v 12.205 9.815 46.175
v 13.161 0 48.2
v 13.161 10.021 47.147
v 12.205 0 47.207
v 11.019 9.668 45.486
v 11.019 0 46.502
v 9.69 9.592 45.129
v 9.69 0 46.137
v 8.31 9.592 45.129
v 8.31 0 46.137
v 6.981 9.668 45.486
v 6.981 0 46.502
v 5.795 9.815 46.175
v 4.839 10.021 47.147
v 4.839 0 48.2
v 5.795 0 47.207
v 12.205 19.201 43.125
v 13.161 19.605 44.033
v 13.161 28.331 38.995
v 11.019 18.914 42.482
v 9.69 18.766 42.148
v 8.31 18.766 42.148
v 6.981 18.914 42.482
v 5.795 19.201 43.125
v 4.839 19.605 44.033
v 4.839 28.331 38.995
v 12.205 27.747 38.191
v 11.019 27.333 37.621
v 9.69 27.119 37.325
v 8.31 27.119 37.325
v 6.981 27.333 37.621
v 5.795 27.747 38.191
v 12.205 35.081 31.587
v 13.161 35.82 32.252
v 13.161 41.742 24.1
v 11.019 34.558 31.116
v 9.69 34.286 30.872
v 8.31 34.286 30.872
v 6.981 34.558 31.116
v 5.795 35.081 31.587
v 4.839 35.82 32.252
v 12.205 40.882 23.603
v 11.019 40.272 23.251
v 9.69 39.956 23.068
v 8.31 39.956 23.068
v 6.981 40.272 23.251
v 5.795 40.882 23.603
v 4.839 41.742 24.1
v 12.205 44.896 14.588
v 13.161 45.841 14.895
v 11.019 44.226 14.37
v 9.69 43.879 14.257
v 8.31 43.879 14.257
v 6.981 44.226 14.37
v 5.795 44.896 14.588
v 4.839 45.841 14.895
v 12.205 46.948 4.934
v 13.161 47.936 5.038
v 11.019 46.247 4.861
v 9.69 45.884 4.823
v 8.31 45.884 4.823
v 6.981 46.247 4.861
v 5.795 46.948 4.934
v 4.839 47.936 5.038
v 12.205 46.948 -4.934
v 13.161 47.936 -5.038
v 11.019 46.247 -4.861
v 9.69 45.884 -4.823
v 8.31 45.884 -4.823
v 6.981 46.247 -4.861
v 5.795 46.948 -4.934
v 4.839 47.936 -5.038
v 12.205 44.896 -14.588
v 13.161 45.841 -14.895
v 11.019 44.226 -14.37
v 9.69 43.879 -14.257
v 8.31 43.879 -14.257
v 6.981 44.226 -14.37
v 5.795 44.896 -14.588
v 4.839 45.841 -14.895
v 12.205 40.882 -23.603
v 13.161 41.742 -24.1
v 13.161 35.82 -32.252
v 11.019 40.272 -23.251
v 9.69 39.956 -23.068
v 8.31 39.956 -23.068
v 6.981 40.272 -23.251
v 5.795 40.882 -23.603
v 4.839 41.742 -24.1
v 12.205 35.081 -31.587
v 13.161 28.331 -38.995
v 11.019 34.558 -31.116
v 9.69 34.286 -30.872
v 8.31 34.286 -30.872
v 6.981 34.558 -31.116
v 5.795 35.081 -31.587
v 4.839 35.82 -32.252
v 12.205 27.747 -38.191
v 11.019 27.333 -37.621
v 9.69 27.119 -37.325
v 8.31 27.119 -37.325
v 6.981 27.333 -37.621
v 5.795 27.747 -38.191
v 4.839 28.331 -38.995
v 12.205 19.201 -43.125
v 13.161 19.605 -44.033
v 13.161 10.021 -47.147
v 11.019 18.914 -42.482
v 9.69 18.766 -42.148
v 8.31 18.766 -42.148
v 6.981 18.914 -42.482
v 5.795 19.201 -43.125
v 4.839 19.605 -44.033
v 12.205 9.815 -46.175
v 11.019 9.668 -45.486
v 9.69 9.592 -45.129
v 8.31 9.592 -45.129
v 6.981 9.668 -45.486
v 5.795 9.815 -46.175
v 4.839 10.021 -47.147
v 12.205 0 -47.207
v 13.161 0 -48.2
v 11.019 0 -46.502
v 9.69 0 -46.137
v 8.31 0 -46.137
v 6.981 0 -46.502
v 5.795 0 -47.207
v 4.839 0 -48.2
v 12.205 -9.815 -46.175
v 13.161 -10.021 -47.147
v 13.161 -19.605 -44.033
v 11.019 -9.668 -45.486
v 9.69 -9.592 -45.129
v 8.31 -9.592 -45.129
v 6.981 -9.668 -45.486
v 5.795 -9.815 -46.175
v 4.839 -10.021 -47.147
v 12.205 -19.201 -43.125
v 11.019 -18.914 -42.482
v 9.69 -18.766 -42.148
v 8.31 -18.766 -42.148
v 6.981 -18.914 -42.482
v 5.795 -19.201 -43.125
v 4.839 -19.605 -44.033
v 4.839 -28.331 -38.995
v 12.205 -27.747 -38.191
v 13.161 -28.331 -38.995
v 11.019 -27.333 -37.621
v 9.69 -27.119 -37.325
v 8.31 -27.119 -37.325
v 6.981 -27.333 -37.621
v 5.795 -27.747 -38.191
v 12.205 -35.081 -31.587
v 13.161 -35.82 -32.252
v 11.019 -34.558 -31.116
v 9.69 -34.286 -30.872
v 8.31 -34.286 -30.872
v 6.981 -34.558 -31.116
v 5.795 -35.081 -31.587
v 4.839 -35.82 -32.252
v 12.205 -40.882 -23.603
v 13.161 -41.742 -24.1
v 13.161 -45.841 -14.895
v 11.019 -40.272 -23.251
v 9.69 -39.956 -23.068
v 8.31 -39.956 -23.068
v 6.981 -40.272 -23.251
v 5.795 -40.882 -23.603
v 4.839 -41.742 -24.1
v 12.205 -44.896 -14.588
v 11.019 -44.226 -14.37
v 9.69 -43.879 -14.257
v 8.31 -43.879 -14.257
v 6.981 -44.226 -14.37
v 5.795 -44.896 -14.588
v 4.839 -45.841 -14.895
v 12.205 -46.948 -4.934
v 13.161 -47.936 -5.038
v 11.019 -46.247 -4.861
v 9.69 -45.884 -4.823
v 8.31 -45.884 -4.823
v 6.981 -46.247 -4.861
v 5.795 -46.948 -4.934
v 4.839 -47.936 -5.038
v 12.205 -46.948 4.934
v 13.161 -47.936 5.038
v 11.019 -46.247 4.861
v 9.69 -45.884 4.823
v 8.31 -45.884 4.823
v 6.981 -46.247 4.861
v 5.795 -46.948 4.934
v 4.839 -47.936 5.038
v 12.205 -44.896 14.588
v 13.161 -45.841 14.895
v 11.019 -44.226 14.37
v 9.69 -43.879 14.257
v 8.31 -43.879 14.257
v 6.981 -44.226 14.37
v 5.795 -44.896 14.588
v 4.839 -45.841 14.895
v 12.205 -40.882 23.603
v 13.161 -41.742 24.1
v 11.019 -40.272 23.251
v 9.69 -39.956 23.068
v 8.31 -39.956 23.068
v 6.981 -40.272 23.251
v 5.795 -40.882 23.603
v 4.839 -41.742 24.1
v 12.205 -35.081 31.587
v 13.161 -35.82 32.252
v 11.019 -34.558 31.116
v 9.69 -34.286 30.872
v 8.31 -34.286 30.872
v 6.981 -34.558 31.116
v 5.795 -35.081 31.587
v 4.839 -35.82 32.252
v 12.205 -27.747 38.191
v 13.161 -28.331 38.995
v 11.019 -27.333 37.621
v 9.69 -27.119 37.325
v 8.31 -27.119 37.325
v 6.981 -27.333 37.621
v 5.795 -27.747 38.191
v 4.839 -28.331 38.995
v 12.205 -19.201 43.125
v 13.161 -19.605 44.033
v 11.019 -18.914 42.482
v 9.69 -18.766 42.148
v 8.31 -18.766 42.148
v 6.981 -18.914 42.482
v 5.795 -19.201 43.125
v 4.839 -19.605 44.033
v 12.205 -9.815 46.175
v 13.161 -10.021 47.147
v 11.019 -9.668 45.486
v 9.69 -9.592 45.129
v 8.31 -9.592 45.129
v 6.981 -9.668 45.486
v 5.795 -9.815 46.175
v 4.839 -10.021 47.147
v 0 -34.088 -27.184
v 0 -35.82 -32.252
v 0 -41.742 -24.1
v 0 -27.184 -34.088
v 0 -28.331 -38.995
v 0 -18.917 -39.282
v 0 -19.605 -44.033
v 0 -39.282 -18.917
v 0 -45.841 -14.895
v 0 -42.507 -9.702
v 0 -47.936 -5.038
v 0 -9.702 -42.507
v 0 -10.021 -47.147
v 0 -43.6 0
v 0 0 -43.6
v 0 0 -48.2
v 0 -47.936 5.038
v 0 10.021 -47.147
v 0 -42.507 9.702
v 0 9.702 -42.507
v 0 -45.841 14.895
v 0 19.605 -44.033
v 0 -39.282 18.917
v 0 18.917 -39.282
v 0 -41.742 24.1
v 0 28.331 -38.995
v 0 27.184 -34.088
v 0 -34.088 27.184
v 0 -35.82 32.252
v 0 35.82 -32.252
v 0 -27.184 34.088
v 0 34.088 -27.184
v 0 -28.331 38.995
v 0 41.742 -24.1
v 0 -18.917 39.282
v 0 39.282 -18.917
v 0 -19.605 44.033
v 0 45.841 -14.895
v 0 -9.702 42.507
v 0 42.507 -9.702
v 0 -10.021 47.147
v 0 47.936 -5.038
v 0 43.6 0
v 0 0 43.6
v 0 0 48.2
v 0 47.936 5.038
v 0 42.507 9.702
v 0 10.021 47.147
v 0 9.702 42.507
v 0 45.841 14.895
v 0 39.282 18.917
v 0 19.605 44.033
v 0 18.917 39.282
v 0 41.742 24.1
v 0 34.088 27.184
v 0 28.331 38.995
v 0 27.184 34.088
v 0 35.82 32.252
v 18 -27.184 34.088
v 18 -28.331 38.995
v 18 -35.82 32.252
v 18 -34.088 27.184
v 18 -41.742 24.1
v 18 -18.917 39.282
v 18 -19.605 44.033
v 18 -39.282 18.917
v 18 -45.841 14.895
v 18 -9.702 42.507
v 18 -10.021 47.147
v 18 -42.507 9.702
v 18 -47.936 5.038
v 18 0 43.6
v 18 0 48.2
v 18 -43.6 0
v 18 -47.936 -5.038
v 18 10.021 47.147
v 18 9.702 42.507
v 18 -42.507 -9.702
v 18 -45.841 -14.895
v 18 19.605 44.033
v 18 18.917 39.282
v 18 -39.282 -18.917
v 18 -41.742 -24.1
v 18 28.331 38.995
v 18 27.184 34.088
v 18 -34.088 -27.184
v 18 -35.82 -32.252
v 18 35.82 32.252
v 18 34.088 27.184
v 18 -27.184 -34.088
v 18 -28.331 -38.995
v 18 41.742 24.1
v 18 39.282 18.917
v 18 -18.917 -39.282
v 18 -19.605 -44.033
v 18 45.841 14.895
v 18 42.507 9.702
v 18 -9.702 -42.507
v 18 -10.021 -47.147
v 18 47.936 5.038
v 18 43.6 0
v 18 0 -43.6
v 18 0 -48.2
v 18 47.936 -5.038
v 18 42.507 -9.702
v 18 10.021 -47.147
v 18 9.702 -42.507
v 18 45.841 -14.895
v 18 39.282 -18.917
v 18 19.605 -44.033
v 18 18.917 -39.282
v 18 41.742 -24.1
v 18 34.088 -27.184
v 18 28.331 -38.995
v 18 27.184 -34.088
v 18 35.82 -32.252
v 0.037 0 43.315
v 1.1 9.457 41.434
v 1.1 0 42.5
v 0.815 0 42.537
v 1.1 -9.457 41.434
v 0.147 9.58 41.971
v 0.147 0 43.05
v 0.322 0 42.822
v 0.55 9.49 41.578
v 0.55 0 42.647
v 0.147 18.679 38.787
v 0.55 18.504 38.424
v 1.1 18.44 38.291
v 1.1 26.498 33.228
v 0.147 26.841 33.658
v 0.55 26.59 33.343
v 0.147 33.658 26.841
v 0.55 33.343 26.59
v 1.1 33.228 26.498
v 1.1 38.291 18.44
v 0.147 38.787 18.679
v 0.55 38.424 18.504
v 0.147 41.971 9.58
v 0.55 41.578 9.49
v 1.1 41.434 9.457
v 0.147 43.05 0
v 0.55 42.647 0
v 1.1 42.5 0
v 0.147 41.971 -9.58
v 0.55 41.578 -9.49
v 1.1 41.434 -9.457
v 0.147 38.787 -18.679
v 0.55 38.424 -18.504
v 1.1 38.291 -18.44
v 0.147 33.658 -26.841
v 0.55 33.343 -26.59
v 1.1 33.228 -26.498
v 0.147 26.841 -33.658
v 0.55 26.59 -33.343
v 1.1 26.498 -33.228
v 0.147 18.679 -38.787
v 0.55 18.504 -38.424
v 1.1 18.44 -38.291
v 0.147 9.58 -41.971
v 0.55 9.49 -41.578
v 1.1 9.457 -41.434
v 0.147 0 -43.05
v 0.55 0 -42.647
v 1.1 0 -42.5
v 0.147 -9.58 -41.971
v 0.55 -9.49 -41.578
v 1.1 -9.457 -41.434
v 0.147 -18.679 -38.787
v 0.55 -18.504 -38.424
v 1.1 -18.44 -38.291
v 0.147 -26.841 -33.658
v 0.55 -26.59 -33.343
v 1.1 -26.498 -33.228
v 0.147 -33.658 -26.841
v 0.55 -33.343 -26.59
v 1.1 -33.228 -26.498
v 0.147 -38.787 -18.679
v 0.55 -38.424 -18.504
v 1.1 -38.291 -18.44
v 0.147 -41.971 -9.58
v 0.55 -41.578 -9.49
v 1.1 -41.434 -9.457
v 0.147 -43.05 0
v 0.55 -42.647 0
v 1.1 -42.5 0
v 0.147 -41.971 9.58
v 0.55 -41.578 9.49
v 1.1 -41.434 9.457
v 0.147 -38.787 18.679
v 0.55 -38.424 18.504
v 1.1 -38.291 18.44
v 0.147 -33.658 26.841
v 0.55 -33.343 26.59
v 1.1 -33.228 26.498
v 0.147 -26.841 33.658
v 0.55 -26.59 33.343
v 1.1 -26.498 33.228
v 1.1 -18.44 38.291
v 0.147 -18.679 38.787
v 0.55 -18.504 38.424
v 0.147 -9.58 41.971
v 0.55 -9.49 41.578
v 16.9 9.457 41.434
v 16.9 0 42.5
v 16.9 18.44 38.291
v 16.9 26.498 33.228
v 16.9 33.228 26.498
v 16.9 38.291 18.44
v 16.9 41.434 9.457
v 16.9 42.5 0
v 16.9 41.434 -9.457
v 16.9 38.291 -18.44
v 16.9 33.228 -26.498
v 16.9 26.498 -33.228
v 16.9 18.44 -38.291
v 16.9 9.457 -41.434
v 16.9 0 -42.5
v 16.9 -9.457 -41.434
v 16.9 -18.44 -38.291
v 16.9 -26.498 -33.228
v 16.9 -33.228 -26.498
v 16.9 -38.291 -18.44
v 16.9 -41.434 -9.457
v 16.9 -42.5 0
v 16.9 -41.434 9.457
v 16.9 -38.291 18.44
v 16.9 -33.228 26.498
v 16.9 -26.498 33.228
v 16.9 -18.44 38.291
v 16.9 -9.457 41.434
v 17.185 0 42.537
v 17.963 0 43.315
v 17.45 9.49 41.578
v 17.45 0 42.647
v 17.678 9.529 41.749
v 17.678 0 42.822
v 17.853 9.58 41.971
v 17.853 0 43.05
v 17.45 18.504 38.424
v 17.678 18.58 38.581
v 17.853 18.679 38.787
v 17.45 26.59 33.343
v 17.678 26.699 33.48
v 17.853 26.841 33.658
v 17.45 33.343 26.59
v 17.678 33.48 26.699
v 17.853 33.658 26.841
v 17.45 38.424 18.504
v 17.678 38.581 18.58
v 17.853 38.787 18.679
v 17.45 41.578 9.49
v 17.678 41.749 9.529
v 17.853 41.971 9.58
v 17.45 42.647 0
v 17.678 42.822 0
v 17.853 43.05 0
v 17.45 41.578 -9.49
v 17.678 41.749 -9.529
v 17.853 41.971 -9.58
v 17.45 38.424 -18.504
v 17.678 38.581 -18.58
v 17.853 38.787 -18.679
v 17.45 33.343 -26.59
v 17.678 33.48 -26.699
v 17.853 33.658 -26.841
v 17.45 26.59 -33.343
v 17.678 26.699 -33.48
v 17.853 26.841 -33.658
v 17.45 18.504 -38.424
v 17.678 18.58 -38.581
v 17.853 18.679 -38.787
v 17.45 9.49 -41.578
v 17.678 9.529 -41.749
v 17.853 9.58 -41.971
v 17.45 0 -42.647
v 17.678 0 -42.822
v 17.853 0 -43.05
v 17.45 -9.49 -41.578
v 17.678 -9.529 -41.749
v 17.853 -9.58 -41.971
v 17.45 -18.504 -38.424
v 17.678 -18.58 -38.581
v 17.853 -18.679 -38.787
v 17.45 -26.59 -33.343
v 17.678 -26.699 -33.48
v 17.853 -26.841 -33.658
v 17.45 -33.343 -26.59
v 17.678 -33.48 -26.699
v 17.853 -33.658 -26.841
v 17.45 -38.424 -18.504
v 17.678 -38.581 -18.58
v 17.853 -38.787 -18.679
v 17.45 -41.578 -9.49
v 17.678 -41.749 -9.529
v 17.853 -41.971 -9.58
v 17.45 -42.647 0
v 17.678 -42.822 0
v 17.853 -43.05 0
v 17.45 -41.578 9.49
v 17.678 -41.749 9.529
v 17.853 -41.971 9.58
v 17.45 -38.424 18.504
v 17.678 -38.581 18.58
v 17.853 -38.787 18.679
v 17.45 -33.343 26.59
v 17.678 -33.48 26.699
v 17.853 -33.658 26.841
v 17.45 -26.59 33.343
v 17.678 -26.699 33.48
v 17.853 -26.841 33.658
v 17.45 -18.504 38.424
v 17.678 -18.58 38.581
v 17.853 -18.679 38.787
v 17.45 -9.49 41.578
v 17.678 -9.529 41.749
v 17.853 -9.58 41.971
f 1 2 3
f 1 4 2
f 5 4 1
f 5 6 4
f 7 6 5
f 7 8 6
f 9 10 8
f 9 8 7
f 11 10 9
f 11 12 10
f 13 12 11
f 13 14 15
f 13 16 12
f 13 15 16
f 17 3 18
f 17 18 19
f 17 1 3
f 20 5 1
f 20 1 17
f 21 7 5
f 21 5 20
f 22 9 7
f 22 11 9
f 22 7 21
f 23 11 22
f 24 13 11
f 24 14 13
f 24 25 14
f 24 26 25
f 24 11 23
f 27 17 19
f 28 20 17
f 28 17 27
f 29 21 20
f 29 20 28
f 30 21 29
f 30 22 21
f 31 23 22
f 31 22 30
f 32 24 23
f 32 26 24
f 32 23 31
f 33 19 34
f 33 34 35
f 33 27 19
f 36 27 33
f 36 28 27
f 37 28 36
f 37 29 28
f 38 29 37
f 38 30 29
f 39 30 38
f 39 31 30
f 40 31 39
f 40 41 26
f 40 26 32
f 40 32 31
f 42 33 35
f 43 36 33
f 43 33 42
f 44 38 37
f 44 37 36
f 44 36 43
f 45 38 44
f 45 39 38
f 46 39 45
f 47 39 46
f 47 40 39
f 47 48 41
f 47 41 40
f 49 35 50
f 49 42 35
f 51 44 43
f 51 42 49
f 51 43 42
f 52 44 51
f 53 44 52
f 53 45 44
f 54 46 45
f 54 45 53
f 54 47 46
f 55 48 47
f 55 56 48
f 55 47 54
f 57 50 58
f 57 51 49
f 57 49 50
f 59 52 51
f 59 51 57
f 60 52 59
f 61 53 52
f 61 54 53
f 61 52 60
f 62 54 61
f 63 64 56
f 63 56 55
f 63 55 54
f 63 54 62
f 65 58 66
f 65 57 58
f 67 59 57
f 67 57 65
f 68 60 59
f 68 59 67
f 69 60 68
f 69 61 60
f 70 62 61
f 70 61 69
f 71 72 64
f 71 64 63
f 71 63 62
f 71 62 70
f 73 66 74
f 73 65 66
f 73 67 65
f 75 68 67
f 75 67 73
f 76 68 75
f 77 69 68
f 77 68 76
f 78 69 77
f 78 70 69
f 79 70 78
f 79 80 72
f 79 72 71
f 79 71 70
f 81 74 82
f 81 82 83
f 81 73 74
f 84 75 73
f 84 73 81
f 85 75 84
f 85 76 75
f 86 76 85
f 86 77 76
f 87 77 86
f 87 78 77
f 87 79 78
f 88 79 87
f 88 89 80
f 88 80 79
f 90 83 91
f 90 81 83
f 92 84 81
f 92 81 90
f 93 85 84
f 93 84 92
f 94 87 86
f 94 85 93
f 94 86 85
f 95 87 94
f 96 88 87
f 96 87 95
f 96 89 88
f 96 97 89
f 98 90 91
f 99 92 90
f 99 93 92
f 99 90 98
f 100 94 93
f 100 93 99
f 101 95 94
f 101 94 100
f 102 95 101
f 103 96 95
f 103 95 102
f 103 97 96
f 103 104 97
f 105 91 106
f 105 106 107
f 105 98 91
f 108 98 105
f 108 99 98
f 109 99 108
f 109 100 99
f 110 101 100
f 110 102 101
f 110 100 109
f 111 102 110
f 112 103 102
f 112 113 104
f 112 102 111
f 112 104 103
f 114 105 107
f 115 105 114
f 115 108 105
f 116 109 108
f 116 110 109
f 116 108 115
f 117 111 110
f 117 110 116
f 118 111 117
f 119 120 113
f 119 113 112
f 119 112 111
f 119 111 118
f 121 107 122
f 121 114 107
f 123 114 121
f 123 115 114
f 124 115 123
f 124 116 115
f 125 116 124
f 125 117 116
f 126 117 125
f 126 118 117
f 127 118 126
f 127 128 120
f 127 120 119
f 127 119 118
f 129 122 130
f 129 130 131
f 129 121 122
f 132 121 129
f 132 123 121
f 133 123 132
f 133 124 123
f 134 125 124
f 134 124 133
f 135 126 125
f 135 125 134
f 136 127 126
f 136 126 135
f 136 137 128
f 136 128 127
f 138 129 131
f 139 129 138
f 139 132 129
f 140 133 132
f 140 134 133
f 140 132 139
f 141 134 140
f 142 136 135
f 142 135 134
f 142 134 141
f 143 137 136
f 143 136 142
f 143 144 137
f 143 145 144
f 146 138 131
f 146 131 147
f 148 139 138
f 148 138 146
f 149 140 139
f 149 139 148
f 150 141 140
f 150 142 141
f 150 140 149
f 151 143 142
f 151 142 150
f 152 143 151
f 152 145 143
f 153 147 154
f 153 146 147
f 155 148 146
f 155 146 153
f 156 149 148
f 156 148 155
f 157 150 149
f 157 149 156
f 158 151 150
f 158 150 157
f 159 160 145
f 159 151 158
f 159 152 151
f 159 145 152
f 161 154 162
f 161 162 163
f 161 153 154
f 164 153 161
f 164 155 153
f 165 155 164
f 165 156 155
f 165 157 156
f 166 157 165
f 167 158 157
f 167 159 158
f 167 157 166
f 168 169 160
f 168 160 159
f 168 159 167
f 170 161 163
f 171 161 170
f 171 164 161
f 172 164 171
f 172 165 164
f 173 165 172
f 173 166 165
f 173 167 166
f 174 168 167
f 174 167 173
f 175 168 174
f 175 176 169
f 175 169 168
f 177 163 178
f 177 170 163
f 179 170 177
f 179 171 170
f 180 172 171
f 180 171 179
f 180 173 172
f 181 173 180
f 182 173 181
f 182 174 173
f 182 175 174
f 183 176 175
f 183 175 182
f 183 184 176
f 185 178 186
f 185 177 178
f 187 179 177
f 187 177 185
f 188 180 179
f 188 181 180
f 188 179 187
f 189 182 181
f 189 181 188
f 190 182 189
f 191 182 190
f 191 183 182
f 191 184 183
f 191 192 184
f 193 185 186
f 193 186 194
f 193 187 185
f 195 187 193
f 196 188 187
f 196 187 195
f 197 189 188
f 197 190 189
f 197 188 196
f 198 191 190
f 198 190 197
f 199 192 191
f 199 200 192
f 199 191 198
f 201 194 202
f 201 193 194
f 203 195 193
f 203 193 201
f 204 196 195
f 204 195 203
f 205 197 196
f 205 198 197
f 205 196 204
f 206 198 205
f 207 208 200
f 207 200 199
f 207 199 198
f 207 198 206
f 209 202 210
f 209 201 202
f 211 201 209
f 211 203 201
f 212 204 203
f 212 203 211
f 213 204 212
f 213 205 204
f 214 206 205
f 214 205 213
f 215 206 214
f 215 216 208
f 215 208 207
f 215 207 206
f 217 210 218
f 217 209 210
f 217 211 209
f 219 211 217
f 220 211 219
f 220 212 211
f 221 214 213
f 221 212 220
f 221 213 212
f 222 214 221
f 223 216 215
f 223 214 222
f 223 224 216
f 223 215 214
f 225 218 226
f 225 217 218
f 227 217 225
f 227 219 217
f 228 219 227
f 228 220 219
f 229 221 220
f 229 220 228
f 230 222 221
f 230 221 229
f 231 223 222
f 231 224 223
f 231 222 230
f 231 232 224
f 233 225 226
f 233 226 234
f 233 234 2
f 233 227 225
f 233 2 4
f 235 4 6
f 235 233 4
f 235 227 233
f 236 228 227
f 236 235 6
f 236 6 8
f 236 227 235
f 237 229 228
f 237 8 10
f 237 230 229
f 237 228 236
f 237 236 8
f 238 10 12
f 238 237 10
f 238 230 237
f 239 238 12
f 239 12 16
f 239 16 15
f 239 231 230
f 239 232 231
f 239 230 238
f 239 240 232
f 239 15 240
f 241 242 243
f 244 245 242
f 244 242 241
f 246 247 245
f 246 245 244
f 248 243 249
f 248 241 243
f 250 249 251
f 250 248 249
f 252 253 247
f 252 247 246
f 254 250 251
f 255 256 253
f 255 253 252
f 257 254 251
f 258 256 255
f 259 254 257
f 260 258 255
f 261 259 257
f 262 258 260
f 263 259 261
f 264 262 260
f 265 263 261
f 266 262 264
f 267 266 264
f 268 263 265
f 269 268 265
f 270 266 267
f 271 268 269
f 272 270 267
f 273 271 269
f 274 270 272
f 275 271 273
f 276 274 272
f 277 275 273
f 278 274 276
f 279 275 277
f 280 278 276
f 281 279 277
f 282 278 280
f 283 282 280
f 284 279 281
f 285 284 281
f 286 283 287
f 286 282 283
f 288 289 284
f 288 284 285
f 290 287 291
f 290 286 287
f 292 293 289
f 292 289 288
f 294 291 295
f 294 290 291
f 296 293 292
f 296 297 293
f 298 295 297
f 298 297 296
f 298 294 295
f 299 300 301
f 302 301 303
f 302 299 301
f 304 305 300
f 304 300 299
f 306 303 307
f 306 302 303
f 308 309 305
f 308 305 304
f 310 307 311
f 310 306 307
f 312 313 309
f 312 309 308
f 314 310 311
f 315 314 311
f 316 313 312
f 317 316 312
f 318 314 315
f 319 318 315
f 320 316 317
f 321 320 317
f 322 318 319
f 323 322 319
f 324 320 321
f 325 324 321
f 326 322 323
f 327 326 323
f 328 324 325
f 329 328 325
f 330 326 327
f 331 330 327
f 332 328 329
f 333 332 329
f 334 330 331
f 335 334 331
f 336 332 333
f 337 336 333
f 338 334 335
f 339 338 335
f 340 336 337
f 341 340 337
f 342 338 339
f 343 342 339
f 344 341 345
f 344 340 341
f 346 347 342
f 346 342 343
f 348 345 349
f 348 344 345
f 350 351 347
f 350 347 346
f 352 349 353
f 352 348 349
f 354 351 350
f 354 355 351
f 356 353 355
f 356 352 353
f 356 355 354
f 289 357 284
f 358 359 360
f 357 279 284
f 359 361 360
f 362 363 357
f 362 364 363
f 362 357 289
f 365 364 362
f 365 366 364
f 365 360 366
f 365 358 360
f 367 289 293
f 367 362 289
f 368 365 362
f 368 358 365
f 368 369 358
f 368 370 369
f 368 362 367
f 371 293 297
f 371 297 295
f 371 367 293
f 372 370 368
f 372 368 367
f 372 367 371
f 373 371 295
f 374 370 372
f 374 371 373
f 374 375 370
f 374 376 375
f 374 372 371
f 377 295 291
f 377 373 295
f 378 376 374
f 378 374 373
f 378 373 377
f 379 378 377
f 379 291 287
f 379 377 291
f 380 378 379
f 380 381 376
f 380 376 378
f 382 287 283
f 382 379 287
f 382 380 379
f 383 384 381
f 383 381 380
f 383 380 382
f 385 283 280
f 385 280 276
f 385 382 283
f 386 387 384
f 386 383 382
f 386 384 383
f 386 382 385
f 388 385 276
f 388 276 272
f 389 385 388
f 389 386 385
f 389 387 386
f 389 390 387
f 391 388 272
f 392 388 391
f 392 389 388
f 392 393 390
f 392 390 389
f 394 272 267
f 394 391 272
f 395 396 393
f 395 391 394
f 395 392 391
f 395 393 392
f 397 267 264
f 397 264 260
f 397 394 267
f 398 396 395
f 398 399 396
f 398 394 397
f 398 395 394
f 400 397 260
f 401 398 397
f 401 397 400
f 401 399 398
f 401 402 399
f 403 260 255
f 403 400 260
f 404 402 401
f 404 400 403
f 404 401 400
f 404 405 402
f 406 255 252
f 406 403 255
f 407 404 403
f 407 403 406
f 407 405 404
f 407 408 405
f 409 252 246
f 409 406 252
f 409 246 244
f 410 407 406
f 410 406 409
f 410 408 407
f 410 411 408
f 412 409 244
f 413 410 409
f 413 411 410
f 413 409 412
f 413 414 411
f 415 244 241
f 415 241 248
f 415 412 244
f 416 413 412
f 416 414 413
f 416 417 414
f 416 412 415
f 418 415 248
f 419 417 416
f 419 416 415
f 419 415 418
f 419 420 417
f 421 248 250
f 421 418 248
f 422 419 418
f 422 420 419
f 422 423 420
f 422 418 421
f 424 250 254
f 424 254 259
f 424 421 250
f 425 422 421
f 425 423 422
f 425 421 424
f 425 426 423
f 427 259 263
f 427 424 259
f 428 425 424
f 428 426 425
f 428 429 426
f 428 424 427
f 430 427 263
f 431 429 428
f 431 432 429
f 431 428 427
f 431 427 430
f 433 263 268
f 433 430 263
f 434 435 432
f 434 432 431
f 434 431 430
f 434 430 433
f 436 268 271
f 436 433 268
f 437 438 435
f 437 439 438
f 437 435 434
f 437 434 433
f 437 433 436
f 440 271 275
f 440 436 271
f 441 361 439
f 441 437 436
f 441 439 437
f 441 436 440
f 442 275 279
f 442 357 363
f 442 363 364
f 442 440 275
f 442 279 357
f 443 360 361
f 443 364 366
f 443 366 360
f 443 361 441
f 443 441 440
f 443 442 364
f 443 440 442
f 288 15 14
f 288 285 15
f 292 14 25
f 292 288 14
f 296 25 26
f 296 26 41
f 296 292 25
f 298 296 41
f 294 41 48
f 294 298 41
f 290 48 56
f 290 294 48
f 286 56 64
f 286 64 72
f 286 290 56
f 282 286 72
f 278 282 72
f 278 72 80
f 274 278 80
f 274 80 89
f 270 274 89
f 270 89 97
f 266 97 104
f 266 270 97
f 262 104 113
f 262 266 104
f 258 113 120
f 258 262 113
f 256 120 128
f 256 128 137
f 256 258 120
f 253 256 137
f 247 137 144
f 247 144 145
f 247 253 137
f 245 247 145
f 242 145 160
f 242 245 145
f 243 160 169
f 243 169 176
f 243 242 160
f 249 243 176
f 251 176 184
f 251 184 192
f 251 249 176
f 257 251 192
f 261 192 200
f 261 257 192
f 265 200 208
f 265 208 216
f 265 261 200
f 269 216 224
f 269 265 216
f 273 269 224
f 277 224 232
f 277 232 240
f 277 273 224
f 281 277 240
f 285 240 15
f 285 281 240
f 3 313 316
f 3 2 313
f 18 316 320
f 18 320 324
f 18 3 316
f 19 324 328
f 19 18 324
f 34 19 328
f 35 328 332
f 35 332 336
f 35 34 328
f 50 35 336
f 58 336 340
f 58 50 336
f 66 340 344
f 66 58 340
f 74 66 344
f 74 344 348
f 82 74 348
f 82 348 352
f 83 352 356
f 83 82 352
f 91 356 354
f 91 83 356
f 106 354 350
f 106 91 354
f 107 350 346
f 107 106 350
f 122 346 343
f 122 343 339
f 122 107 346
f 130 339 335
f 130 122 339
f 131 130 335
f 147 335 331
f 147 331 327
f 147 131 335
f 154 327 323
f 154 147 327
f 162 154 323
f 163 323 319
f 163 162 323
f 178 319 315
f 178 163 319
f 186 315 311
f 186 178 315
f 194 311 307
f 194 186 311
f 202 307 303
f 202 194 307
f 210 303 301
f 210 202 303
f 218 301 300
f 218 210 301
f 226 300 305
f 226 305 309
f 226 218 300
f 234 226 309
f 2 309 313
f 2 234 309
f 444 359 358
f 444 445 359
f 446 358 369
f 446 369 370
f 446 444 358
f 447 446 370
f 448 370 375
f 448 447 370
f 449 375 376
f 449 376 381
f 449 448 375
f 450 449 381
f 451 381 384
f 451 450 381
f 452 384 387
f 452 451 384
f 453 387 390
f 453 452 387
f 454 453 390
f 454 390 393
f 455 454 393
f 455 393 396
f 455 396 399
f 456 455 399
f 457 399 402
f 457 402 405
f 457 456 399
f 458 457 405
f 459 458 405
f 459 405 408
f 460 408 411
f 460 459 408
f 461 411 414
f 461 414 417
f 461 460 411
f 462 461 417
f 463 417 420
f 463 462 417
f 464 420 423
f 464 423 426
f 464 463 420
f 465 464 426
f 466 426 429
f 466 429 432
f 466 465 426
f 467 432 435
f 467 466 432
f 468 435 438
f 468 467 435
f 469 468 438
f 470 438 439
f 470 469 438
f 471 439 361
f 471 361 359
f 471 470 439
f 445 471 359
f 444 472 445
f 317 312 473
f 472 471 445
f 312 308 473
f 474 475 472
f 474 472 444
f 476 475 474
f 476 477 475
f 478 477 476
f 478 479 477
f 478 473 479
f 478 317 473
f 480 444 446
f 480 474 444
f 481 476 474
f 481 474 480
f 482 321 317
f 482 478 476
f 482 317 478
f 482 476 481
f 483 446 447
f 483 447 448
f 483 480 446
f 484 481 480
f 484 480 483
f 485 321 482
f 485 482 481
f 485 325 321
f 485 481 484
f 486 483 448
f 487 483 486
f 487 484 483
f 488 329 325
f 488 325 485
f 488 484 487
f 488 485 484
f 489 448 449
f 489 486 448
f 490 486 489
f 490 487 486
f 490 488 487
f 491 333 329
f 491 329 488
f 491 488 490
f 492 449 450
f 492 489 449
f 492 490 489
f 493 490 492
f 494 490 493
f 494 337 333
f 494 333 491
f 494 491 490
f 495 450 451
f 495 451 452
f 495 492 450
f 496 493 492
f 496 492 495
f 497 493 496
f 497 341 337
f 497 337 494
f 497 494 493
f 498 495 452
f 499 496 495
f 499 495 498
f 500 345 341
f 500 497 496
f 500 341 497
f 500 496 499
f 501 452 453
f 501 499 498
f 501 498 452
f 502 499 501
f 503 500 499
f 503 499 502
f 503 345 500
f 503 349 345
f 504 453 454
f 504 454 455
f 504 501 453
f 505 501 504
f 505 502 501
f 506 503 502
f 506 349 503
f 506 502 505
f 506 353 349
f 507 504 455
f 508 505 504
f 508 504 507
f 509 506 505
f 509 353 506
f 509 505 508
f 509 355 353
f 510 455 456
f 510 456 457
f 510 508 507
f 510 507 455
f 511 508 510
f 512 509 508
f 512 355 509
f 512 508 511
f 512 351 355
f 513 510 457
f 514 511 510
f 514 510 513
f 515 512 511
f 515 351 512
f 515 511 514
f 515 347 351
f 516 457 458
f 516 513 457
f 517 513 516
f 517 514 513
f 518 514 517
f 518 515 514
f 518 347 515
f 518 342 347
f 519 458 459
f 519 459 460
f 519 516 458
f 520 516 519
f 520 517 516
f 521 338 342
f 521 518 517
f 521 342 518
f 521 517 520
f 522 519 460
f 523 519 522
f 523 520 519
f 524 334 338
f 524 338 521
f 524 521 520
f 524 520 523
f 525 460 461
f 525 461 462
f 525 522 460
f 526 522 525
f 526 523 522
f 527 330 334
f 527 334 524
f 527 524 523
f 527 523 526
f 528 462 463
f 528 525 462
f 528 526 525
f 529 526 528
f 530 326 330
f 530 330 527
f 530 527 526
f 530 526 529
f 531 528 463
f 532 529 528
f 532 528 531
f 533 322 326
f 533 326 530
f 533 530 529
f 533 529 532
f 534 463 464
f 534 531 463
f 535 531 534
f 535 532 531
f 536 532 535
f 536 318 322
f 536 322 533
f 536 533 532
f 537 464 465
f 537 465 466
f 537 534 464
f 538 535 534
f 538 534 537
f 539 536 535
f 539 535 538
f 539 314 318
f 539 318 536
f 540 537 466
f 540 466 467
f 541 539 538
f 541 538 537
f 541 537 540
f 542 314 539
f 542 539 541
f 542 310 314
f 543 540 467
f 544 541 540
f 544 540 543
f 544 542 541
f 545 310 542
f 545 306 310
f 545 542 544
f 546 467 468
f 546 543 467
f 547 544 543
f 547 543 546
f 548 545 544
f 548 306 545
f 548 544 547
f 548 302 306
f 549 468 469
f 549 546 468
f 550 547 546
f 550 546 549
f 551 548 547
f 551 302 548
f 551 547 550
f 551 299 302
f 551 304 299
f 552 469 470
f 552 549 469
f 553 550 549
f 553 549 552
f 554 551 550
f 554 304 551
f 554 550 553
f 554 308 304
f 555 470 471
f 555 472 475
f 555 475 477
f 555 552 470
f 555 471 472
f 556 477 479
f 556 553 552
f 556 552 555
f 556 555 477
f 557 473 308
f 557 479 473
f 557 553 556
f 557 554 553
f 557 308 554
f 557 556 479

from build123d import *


with BuildPart() as part:
    # Schizzo1 → Rivoluzione1 (revolve)
    with BuildSketch(Plane.XY, mode=Mode.PRIVATE) as rivoluzione1_sk:
        with BuildLine():
            Line((1.1, 42.5), (16.9, 42.5))
            ThreePointArc((16.9, 42.5), (17.677817459, 42.822182541), (18, 43.6))
            Line((18, 43.6), (18, 48.2))
            Line((18, 48.2), (13.161482939, 48.2))
            ThreePointArc((13.161482939, 48.2), (9, 46.0905), (4.838517061, 48.2))
            Line((4.838517061, 48.2), (0, 48.2))
            Line((0, 48.2), (0, 43.6))
            ThreePointArc((0, 43.6), (0.322182541, 42.822182541), (1.1, 42.5))
        make_face()
    revolve(rivoluzione1_sk.sketch.rotate(Axis((50, 0, 0), (-1, 0, 0)), 270), axis=Axis((50, 0, 0), (-1, 0, 0)))


solid = part.part
